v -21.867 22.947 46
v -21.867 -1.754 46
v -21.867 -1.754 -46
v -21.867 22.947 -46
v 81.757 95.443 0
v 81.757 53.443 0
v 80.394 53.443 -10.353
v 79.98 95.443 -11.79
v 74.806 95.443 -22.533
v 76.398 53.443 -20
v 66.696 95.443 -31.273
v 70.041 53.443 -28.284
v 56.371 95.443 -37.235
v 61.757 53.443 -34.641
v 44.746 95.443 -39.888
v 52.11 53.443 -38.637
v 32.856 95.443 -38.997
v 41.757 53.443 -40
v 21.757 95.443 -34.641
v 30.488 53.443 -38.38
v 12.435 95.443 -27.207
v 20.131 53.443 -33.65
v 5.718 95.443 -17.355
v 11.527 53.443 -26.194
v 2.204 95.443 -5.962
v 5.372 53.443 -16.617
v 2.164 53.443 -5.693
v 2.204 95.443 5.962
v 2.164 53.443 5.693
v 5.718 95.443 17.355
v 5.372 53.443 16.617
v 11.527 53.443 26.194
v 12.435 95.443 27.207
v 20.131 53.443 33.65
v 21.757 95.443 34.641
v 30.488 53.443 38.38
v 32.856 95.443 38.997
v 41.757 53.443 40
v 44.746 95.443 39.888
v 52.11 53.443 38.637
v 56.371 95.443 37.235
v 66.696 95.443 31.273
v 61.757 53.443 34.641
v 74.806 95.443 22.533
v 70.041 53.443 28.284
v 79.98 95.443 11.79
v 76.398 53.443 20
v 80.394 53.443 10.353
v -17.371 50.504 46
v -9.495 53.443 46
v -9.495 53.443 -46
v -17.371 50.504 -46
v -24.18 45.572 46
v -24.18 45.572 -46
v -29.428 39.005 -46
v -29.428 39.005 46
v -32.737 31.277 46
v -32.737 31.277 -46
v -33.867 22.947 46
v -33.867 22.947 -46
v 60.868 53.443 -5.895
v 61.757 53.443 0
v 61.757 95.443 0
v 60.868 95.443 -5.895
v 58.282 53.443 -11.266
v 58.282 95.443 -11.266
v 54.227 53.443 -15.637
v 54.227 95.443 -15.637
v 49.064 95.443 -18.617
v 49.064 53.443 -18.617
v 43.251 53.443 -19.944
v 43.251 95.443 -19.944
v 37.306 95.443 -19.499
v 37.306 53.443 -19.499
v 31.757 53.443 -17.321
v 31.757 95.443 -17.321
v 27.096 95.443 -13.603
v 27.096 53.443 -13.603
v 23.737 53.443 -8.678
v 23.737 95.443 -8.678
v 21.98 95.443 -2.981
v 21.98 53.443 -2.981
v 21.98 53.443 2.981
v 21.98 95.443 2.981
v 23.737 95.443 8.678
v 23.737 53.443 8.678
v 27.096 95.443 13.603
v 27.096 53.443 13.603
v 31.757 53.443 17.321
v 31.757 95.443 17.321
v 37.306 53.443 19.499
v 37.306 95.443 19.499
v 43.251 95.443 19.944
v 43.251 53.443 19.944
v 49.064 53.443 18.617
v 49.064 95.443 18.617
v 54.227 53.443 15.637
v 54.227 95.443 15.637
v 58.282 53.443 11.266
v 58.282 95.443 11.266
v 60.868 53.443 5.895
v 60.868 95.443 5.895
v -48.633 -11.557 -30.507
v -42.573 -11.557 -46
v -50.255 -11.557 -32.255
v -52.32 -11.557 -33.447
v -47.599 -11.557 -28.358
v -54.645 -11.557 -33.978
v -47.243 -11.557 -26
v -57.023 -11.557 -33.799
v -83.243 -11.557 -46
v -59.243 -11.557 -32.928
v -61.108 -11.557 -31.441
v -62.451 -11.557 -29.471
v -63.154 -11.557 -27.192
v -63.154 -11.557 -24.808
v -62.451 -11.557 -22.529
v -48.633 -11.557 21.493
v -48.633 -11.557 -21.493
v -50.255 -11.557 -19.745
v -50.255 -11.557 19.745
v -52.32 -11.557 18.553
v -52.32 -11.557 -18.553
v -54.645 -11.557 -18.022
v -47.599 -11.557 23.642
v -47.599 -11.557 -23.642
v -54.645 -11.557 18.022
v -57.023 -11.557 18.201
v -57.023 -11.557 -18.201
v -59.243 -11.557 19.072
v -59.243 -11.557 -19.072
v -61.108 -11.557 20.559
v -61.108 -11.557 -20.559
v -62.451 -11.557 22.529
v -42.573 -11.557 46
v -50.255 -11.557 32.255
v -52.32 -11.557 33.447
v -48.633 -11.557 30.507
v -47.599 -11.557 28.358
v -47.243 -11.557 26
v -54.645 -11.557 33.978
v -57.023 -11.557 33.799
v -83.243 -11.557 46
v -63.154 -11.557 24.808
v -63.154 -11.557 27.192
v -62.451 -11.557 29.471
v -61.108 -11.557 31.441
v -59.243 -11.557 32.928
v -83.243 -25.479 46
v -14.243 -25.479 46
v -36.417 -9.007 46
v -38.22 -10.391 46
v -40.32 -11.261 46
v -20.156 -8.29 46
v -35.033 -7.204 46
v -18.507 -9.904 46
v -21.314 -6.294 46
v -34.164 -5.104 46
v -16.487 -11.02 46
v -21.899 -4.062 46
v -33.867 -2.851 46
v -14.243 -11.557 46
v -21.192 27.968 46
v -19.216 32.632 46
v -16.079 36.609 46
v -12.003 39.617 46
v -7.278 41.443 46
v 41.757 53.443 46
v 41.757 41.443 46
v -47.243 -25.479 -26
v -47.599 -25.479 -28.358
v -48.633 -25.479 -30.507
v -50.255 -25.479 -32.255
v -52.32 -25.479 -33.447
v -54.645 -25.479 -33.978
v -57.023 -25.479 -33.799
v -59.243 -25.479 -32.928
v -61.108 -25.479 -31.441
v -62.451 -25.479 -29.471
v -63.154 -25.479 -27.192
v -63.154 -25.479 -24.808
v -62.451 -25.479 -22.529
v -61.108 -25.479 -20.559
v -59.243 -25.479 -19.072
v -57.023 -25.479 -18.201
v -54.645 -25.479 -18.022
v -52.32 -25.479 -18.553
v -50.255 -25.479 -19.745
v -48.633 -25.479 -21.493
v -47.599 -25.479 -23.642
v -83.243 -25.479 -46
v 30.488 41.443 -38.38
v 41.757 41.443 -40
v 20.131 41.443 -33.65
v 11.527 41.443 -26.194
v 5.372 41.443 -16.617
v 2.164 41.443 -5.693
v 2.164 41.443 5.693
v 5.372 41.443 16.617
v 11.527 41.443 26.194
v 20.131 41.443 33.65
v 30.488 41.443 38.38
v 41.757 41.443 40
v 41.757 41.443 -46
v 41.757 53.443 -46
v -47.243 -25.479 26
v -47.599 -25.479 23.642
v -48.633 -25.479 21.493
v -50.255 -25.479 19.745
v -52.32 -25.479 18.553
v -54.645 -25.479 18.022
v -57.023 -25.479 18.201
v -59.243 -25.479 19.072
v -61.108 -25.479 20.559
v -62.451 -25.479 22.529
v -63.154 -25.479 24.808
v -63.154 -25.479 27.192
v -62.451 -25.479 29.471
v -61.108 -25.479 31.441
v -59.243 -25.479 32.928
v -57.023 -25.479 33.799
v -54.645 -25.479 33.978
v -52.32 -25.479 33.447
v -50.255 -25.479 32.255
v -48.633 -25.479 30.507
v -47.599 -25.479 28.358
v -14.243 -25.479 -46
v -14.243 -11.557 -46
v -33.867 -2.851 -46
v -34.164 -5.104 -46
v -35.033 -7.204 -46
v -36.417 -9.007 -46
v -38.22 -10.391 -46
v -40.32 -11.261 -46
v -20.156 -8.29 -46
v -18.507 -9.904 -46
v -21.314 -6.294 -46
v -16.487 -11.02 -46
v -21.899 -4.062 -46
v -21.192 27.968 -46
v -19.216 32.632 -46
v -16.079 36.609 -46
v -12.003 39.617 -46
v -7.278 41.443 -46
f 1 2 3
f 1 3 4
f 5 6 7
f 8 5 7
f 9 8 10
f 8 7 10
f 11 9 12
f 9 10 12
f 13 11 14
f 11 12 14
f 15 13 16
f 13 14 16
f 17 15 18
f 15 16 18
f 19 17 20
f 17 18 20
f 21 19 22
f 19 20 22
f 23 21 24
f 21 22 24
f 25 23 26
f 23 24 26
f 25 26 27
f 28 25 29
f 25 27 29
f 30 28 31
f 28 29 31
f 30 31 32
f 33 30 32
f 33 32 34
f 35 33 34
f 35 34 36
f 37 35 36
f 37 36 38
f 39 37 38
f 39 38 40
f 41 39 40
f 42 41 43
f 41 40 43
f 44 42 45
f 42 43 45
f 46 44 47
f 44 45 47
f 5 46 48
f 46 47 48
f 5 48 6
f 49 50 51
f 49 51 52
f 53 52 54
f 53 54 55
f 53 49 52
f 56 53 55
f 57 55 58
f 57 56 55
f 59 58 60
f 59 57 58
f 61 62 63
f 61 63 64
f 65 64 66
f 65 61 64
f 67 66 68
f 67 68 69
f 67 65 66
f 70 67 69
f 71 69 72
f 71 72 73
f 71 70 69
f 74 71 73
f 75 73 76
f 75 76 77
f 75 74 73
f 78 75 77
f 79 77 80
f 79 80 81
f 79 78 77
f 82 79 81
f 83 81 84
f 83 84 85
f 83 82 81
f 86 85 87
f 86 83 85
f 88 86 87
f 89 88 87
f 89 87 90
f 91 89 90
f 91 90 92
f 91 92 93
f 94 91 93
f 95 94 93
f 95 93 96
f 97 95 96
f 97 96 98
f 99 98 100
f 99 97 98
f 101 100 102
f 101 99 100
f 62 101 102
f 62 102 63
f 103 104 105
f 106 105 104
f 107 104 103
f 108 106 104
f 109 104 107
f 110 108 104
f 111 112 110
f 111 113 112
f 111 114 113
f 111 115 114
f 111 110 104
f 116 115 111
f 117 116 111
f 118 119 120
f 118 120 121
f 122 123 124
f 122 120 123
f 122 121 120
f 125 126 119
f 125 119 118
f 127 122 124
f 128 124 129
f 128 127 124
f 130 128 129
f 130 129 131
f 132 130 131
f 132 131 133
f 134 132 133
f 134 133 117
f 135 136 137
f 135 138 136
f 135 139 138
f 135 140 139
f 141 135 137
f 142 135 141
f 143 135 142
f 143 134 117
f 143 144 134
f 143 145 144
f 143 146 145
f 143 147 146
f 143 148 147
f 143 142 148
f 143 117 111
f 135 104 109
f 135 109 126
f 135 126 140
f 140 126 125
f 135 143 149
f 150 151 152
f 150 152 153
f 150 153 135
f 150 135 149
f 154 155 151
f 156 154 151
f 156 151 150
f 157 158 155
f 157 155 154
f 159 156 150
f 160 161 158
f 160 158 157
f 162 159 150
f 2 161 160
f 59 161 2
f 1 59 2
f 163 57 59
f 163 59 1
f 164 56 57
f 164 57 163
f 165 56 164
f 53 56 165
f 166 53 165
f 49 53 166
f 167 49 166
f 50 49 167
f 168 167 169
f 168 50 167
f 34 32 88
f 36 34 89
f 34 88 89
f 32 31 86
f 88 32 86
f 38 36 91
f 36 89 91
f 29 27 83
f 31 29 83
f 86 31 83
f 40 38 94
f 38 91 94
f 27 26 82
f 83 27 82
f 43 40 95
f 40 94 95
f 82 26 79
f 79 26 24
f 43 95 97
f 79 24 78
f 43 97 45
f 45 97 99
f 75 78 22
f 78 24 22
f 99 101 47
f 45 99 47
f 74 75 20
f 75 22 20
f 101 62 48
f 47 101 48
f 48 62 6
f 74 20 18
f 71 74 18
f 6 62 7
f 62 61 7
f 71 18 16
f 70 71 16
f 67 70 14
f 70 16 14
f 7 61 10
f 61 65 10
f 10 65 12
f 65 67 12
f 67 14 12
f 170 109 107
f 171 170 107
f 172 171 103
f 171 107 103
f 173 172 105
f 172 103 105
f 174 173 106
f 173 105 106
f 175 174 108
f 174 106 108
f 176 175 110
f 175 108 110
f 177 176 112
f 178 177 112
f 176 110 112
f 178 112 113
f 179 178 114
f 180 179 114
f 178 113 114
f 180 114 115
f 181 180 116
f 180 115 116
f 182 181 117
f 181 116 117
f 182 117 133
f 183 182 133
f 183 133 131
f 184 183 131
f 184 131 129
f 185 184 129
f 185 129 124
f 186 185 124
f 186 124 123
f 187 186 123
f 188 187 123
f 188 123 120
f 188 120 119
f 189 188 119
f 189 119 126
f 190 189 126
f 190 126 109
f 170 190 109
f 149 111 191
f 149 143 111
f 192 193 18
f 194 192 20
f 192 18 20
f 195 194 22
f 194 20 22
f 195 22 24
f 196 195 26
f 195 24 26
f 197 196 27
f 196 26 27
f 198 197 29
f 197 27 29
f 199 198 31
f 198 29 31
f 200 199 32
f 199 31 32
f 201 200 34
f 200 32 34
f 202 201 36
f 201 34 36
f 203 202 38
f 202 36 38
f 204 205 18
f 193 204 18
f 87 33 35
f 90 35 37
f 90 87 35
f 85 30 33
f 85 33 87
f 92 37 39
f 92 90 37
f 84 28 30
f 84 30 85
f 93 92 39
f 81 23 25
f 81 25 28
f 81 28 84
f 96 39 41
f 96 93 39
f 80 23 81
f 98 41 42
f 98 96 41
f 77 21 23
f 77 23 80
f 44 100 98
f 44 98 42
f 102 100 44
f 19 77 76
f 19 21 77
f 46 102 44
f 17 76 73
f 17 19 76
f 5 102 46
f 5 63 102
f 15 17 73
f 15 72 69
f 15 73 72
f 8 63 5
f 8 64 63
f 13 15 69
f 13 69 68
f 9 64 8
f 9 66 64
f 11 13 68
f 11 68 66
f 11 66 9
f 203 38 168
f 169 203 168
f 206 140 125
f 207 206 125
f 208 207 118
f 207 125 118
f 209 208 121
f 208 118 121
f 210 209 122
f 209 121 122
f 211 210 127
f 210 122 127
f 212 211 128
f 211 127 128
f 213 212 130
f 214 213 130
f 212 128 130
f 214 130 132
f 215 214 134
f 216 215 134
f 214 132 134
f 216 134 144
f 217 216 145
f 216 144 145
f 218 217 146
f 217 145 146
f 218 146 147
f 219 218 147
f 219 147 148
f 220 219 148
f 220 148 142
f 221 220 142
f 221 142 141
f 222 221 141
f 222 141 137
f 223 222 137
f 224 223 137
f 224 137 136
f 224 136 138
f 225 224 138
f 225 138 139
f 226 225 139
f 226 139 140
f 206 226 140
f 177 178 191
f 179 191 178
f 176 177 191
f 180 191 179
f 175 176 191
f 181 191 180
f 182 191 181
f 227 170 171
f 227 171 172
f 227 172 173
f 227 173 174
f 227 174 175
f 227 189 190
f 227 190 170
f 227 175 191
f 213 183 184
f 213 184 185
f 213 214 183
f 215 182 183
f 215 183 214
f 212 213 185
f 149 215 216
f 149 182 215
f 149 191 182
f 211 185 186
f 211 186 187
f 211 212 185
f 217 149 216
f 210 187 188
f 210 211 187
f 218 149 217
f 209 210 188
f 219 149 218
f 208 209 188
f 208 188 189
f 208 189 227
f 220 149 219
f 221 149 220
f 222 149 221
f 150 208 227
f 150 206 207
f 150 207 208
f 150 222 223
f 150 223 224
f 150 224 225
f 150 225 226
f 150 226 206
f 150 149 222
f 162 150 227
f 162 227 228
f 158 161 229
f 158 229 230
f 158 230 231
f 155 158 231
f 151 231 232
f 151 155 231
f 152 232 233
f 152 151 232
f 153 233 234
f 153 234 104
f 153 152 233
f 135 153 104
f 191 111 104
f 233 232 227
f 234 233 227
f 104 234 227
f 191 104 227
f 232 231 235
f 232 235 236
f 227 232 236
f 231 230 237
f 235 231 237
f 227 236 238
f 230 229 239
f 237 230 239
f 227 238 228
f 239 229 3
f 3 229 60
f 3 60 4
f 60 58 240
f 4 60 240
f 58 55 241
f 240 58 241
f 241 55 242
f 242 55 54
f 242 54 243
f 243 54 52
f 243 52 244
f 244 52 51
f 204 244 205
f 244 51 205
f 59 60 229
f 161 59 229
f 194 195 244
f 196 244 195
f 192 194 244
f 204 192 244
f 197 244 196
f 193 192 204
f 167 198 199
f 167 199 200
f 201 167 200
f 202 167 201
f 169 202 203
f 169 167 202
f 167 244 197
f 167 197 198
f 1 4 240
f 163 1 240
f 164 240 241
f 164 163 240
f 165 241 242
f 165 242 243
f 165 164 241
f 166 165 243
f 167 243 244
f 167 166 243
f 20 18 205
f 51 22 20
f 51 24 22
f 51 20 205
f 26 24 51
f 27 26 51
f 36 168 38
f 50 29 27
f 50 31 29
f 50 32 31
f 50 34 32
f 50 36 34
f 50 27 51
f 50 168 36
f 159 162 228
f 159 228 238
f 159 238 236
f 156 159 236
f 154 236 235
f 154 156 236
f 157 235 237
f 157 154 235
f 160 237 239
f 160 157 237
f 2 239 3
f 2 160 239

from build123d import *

# Parameters (mm, degrees)
BOSS_EXTRUDE4_DEPTH      = 46
BOSS_EXTRUDE4_DEPTH_BACK = 46
BOSS_EXTRUDE7_DEPTH      = 42
BOSS_EXTRUDE7_DEPTH_BACK = 18
SKETCH4_R                = 20
CUT_EXTRUDE6_DEPTH       = 49
SKETCH3_R                = 8
CUT_EXTRUDE7_DEPTH       = 49


with BuildPart() as part:
    # Sketch1 → Boss-Extrude4 (new, two sides: drawn at the far end of the back side and taken through both)
    with BuildSketch(Plane.XY.offset(-BOSS_EXTRUDE4_DEPTH_BACK)):
        with BuildLine():
            Line((-83.24312297, -25.479382505), (-14.24312297, -25.479382505))
            Line((-14.24312297, -25.479382505), (-14.24312297, -11.557434351))
            ThreePointArc((-14.24312297, -11.557434351), (-20.155754423, -8.289544205), (-21.866972477, -1.754251597))
            Line((-21.866972477, -1.754251597), (-21.866972477, 22.947247706))
            ThreePointArc((-21.866972477, 22.947247706), (-17.780772391, 34.725544597), (-7.278061456, 41.442565649))
            Line((-7.278061456, 41.442565649), (87.990821984, 41.442565649))
            Line((87.990821984, 41.442565649), (87.990821984, 53.442590356))
            Line((87.990821984, 53.442590356), (-9.495412844, 53.442590356))
            ThreePointArc((-9.495412844, 53.442590356), (-27.025554627, 42.466077348), (-33.866972477, 22.947247706))
            Line((-33.866972477, 22.947247706), (-33.866972477, -2.851012333))
            ThreePointArc((-33.866972477, -2.851012333), (-36.417024446, -9.007382382), (-42.573394495, -11.557434351))
            Line((-42.573394495, -11.557434351), (-83.24312297, -11.557434351))
            Line((-83.24312297, -11.557434351), (-83.24312297, -25.479382505))
        make_face()
    extrude(amount=BOSS_EXTRUDE4_DEPTH + BOSS_EXTRUDE4_DEPTH_BACK)

    # Sketch4 → Boss-Extrude7 (add, two sides: drawn at the far end of the back side and taken through both)
    with BuildSketch(Plane(origin=(0, 53.442590356, 0), x_dir=(1, 0, 0), z_dir=(0, 1, 0)).offset(-BOSS_EXTRUDE7_DEPTH_BACK)):
        with BuildLine():
            ThreePointArc((41.75687703, -40), (70.041148278, -28.284271247), (81.75687703, 0))
            ThreePointArc((81.75687703, 0), (70.041148278, 28.284271247), (41.75687703, 40))
            ThreePointArc((41.75687703, 40), (1.75687703, 0), (41.75687703, -40))
        make_face()
        with Locations((41.75687703, 0)):
            Circle(SKETCH4_R, mode=Mode.SUBTRACT)
    extrude(amount=BOSS_EXTRUDE7_DEPTH + BOSS_EXTRUDE7_DEPTH_BACK)

    # Sketch5 → Cut-Extrude6 (cut)
    with BuildSketch(Plane(origin=(0, 53.442590356, 0), x_dir=(1, 0, 0), z_dir=(0, 1, 0))):
        with BuildLine():
            Line((41.75687703, 46), (41.75687703, 40))
            ThreePointArc((41.75687703, 40), (1.75687703, 0), (41.75687703, -40))
            Line((41.75687703, -40), (41.75687703, -46))
            Line((41.75687703, -46), (87.990821984, -46))
            Line((87.990821984, -46), (87.990821984, 46))
            Line((87.990821984, 46), (41.75687703, 46))
        make_face()
    extrude(amount=-CUT_EXTRUDE6_DEPTH, mode=Mode.SUBTRACT)


with BuildPart() as cut_extrude6_piece_1:
    # of the separate pieces the step leaves, piece 1, a body of its own (cut_extrude6_pieces)
    add(part.part.solids().sort_by_distance((-42.573394495, -11.557434351, 46))[0])

    # Sketch3 → Cut-Extrude7 (cut)
    with BuildSketch(Plane(origin=(0, -11.557434351, 0), x_dir=(1, 0, 0), z_dir=(0, 1, 0))):
        with Locations((-55.24312297, 26)):
            Circle(SKETCH3_R)
        with Locations((-55.24312297, -26)):
            Circle(SKETCH3_R)
    extrude(amount=-CUT_EXTRUDE7_DEPTH, mode=Mode.SUBTRACT)


with BuildPart() as cut_extrude6_piece_2:
    # of the separate pieces the step leaves, piece 2, a body of its own (cut_extrude6_pieces)
    add(part.part.solids().sort_by_distance((41.75687703, 95.442590356, -40))[0])


solid = Compound([cut_extrude6_piece_1.part, cut_extrude6_piece_2.part])
